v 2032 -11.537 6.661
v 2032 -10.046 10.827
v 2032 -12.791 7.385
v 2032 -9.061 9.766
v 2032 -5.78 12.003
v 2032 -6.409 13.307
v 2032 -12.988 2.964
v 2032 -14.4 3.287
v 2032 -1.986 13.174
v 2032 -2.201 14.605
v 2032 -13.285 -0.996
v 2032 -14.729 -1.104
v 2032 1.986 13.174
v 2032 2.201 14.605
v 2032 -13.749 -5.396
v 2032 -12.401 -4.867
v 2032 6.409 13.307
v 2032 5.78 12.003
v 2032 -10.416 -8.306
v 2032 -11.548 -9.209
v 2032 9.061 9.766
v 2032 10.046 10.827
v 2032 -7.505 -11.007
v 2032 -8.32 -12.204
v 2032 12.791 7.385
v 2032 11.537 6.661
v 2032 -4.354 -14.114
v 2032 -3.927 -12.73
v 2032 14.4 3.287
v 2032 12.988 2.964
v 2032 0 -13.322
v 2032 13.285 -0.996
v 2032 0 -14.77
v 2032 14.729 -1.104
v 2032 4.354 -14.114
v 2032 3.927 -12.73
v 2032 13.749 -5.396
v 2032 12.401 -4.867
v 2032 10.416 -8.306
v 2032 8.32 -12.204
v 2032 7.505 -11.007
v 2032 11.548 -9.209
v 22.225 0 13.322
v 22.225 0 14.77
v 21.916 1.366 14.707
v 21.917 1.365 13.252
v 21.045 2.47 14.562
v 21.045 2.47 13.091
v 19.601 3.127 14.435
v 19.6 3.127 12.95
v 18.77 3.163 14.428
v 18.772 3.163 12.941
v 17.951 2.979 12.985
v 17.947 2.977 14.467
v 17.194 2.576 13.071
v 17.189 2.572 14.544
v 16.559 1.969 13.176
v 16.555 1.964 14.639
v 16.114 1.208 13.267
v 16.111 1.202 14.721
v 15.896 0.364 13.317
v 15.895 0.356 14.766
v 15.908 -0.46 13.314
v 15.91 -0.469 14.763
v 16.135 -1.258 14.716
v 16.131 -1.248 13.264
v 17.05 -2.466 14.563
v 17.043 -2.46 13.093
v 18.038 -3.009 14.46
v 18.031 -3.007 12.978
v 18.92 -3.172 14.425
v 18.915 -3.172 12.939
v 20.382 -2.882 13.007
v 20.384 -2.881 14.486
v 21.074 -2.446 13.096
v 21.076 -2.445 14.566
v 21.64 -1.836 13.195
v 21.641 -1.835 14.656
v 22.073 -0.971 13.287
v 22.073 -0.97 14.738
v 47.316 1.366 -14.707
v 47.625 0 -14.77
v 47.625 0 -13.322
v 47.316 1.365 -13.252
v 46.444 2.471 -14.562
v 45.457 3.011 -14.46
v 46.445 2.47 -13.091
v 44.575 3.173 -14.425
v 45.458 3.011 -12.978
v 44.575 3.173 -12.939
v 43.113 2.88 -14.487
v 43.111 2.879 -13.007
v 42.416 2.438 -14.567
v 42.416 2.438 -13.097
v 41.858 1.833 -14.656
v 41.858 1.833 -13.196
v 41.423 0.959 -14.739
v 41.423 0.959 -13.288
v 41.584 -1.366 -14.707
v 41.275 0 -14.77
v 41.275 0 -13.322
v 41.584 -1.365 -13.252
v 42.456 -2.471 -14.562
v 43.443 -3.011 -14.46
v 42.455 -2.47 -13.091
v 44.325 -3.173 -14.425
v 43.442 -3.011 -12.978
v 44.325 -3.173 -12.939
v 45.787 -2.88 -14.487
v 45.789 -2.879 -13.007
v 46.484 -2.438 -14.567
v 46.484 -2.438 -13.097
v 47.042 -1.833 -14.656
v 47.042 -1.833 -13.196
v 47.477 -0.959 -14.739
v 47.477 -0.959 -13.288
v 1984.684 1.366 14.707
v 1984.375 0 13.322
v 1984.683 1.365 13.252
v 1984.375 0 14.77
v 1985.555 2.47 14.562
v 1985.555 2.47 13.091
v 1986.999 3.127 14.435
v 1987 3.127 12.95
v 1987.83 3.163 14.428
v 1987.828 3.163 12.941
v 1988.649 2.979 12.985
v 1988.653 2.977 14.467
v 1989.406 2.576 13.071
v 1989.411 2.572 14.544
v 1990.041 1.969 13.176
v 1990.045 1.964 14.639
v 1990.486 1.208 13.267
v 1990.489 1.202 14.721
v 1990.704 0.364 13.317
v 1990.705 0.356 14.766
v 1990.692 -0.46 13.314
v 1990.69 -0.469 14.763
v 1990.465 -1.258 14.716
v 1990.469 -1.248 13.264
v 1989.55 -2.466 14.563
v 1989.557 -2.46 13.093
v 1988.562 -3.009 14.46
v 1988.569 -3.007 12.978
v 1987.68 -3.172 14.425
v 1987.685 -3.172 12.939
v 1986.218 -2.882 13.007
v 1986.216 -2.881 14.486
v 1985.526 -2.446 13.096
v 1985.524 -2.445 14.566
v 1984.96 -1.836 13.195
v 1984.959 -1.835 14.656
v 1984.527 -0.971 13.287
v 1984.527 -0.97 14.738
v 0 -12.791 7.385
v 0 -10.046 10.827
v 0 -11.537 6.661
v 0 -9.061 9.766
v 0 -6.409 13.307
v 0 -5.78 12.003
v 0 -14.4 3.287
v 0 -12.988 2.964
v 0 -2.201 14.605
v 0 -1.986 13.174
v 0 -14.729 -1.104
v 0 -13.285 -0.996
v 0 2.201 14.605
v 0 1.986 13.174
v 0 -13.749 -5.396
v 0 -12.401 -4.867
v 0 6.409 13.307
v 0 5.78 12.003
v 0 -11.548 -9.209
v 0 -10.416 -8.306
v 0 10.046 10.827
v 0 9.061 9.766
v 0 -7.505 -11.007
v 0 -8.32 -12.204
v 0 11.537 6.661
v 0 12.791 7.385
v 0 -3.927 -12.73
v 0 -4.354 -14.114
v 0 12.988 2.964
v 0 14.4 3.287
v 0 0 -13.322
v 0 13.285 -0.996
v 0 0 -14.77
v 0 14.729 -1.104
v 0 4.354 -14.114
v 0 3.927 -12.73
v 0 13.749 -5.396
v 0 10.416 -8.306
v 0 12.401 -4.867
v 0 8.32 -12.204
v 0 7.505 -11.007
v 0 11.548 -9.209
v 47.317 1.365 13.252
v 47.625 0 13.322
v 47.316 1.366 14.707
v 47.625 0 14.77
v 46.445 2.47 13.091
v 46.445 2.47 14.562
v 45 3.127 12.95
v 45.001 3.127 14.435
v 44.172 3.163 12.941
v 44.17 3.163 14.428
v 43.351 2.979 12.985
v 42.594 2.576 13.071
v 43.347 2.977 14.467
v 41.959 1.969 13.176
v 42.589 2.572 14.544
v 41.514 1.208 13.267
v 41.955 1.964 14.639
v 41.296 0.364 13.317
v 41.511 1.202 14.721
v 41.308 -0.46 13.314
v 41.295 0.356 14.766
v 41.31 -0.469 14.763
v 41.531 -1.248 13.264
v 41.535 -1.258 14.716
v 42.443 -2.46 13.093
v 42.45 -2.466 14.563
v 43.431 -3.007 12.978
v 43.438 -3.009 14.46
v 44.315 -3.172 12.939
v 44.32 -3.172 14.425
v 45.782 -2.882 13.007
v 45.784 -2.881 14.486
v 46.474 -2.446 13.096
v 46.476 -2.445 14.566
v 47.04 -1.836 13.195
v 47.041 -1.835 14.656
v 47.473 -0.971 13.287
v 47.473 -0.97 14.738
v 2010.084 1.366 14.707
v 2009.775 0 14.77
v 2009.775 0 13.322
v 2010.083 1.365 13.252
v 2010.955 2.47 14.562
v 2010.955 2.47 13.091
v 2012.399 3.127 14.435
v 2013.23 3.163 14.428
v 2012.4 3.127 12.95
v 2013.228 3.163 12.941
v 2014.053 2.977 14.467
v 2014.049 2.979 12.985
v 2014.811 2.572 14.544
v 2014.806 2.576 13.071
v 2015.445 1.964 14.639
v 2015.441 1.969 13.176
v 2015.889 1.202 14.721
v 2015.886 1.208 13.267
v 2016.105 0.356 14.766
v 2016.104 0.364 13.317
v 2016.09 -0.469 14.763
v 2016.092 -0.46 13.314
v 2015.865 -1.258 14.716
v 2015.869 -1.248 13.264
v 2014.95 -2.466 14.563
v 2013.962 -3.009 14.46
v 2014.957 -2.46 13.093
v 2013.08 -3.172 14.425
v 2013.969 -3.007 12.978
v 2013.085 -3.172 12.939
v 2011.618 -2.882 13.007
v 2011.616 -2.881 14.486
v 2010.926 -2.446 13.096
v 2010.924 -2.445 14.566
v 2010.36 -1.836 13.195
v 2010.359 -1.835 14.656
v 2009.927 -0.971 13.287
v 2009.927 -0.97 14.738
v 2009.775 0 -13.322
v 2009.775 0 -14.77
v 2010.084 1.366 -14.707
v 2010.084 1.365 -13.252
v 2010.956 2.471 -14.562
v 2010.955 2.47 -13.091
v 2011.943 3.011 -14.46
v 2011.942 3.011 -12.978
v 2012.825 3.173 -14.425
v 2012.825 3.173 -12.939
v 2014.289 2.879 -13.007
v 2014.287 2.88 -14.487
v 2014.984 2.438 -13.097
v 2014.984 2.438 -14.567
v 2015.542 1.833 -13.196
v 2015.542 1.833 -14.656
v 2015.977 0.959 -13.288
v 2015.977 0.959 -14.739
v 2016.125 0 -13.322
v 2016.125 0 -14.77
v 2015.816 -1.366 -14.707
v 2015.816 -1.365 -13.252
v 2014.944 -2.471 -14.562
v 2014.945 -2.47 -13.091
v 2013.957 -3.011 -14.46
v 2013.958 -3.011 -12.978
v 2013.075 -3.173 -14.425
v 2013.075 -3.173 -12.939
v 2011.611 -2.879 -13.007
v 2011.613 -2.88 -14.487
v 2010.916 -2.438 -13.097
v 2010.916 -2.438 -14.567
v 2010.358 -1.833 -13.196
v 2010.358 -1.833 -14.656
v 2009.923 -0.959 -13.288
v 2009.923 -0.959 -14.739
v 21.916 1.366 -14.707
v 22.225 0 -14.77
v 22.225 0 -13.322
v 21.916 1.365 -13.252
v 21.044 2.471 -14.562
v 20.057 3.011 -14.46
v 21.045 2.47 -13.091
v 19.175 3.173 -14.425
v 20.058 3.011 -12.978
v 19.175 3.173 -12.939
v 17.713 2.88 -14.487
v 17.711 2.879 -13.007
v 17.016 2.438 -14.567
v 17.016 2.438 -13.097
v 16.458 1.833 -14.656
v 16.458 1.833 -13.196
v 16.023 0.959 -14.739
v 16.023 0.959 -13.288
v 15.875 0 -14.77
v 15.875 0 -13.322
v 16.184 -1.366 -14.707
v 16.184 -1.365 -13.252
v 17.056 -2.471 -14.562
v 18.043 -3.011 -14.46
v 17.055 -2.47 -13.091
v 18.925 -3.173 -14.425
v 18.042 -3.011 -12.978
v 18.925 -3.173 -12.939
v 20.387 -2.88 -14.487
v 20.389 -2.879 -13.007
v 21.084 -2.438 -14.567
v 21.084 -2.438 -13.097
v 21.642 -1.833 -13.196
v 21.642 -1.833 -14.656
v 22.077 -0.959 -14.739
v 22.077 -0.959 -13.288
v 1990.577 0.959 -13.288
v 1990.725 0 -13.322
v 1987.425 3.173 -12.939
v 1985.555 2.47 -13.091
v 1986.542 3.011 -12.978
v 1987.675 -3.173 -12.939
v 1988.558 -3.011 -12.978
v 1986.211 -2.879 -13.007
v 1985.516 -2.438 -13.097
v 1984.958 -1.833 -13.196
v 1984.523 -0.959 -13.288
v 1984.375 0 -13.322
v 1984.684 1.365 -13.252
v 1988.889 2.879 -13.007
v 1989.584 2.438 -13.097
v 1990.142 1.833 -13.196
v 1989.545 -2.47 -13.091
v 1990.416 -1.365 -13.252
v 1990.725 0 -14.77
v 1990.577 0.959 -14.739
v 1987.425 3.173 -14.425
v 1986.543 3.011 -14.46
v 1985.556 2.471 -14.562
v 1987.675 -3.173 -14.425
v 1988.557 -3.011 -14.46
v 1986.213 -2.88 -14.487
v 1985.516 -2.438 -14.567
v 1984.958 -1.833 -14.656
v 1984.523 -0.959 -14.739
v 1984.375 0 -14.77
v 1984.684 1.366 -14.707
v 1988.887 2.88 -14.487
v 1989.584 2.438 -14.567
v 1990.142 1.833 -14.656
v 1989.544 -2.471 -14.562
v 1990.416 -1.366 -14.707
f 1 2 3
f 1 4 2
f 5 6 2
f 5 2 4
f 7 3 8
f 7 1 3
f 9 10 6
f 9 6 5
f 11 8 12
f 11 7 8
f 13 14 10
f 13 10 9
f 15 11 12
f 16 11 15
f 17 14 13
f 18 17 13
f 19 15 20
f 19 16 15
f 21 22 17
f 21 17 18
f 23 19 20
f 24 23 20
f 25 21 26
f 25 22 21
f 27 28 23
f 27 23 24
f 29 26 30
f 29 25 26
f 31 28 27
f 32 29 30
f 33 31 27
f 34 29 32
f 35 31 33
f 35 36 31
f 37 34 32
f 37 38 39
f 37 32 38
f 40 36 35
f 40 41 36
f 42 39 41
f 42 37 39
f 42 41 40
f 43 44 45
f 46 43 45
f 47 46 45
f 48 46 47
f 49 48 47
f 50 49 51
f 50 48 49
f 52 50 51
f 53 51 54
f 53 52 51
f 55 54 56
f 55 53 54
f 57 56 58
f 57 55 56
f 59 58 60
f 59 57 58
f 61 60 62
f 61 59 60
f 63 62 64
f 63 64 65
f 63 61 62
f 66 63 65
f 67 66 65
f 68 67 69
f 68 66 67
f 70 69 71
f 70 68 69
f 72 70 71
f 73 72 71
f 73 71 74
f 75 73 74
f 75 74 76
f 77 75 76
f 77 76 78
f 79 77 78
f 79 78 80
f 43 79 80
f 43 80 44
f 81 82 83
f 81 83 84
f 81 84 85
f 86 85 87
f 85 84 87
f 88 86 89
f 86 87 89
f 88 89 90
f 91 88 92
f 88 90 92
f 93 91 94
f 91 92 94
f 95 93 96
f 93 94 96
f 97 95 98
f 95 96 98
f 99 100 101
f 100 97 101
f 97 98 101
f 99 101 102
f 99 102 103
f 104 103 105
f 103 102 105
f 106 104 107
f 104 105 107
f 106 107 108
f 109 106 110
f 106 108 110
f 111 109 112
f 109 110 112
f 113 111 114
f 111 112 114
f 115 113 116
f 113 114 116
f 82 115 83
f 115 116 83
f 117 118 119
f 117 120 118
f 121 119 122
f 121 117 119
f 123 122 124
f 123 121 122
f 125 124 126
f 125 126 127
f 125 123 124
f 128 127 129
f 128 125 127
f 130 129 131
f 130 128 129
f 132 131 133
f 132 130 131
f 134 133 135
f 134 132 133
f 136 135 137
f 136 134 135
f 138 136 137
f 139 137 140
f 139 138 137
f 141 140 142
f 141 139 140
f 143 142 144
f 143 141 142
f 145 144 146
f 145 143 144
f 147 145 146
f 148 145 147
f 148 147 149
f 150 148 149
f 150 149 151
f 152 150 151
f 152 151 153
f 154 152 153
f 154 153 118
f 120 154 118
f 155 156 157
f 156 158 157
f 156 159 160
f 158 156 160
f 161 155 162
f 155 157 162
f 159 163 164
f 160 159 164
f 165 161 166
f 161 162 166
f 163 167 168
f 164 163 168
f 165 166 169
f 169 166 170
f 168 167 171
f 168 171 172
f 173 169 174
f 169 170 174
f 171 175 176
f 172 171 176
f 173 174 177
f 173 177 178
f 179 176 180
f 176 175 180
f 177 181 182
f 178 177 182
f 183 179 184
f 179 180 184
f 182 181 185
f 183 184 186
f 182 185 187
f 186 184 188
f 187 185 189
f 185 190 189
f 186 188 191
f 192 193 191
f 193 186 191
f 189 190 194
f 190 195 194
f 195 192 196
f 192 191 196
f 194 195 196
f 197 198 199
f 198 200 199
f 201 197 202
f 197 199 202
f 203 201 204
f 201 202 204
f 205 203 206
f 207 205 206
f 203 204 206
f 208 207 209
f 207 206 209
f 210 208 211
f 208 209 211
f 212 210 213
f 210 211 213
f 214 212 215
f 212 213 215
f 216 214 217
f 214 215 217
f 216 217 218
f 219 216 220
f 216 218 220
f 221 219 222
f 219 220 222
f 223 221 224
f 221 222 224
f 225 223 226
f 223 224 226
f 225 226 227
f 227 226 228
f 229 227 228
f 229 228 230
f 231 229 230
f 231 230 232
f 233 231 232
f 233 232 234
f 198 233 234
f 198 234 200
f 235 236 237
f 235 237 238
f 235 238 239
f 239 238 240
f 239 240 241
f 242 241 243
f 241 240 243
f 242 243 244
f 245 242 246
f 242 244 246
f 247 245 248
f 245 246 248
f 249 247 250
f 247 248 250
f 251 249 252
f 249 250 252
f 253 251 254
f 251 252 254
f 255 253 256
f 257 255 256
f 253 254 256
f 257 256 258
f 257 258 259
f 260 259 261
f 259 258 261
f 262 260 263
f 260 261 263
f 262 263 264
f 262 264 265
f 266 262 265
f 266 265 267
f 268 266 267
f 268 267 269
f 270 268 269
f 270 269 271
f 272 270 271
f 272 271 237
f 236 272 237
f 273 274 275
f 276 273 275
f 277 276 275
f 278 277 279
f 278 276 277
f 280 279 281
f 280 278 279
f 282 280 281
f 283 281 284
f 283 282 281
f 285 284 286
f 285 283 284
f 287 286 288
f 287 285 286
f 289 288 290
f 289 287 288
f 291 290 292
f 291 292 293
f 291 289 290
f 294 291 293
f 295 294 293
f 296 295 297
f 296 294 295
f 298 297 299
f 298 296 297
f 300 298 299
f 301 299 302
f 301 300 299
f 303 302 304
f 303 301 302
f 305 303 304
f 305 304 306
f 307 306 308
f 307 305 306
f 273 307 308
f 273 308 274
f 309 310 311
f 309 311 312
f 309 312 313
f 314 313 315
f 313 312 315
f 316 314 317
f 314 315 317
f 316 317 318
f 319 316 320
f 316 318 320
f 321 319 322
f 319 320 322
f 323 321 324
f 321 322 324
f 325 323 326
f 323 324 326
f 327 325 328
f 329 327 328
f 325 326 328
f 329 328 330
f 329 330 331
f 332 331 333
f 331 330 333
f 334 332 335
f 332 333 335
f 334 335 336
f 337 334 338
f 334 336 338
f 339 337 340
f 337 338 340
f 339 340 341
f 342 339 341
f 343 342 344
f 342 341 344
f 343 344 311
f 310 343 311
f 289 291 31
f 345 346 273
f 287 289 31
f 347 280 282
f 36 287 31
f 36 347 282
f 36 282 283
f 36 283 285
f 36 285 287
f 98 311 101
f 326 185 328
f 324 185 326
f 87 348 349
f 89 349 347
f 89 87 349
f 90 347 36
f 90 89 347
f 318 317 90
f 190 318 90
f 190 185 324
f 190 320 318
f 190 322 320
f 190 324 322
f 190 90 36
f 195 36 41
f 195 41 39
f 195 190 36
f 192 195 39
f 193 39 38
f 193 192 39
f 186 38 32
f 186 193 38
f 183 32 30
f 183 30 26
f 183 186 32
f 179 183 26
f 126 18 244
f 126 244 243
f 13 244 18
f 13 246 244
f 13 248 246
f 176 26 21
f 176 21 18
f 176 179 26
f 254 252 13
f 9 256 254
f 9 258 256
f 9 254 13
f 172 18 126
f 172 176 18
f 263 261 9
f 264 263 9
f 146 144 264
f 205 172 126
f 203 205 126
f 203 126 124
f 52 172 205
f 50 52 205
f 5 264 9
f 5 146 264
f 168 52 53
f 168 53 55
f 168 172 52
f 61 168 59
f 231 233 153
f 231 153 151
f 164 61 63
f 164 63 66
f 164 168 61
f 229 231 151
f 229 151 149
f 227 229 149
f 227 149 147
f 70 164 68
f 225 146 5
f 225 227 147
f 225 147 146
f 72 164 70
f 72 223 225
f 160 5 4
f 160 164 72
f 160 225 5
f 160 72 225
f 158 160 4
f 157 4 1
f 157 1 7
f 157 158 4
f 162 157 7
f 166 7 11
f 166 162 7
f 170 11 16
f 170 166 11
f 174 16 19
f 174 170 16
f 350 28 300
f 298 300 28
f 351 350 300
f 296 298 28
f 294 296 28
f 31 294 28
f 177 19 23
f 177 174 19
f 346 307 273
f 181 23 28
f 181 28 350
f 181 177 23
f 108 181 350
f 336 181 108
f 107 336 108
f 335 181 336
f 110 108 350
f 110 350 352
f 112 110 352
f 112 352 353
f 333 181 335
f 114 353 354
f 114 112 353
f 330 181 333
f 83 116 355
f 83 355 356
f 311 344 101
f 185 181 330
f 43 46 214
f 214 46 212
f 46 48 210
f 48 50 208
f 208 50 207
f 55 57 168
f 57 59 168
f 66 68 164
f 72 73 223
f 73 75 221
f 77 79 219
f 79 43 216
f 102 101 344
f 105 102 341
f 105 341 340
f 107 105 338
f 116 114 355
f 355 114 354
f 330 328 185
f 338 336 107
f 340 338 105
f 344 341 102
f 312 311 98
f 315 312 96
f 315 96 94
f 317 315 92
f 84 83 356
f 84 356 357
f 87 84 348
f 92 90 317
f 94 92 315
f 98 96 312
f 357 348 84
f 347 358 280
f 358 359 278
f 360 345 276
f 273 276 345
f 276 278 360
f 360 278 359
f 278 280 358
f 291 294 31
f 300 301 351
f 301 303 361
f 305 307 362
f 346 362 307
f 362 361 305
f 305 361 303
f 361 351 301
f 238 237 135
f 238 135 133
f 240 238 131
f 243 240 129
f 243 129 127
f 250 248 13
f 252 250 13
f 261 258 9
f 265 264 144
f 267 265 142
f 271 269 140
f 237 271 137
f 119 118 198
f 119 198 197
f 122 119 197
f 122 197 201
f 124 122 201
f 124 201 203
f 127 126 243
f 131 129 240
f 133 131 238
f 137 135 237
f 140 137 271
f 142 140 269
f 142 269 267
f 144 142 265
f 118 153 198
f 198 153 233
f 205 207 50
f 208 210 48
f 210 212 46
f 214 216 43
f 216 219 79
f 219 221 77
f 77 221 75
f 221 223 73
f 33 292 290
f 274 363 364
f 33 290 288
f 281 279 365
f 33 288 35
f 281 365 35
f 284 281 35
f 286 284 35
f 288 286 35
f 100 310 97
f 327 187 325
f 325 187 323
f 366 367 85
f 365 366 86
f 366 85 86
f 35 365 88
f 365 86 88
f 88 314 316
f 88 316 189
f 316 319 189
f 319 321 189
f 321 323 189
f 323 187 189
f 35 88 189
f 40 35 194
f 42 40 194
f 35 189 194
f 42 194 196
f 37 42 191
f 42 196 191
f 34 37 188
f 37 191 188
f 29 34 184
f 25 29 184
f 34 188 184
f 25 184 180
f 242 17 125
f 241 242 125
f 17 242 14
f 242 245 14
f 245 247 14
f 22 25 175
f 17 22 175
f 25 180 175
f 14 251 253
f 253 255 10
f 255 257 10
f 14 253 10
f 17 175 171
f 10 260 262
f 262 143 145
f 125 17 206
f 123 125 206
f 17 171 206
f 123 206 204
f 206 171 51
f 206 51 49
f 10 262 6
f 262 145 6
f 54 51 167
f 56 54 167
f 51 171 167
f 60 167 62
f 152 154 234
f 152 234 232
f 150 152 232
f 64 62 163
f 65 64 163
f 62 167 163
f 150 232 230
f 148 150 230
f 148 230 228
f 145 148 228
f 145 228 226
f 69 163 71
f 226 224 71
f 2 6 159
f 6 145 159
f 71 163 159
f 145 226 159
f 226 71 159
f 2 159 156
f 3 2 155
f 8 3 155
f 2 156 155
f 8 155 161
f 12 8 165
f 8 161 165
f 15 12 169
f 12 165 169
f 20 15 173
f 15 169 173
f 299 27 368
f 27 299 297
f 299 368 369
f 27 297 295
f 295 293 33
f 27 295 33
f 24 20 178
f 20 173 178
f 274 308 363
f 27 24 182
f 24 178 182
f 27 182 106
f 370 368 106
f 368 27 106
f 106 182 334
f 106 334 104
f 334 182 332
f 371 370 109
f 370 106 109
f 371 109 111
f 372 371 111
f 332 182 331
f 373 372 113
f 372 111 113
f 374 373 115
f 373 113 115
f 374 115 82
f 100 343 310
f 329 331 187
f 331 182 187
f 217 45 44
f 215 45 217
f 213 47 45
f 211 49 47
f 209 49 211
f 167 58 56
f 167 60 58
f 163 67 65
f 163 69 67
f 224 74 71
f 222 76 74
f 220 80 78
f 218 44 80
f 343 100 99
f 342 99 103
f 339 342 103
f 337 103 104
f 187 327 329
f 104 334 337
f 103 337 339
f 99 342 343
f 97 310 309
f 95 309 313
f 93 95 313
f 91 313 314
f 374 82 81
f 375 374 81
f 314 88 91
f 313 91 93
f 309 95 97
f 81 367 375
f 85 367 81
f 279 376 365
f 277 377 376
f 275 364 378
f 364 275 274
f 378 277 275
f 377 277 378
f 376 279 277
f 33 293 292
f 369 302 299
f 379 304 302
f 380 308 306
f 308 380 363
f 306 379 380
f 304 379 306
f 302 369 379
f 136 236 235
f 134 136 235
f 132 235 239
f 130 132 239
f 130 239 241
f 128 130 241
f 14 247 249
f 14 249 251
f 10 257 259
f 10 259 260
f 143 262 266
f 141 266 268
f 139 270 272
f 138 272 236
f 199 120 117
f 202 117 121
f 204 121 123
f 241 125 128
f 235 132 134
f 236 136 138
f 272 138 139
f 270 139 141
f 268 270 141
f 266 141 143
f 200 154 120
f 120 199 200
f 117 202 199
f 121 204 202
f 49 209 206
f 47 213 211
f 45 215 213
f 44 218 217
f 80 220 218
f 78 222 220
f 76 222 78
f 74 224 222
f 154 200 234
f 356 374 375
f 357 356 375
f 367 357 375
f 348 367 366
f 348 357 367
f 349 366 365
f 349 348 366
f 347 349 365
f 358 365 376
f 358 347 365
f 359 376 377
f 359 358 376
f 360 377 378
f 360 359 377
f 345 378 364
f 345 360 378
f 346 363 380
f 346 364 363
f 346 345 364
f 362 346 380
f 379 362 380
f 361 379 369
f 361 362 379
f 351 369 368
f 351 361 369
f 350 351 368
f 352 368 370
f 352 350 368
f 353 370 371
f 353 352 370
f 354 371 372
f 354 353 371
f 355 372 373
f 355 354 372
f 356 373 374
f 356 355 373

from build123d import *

# Parameters (mm, degrees)
SKETCH1_R           = 14.7701
SKETCH1_R_2         = 13.3223
BOSS_EXTRUDE1_DEPTH = 2032
SKETCH2_R           = 3.175
CUT_EXTRUDE1_DEPTH  = 2033.107357328


with BuildPart() as part:
    # Sketch1 → Boss-Extrude1 (new body)
    with BuildSketch(Plane(origin=(0, 0, 0), x_dir=(0, 0, -1), z_dir=(1, 0, 0))):
        Circle(SKETCH1_R)
        Circle(SKETCH1_R_2, mode=Mode.SUBTRACT)
    extrude(amount=BOSS_EXTRUDE1_DEPTH)

    # Sketch2 → Cut-Extrude1 (cut, symmetric)
    with BuildSketch(Plane.XY):
        with Locations((19.05, 0)):
            Circle(SKETCH2_R)
        with Locations((44.45, 0)):
            Circle(SKETCH2_R)
    cut_extrude1 = extrude(amount=CUT_EXTRUDE1_DEPTH, both=True, mode=Mode.SUBTRACT)

    # Mirror1: Cut-Extrude1 across plane
    add(cut_extrude1.mirror(Plane(origin=(1016, 0, 0), x_dir=(0, 0, 1), z_dir=(1, 0, 0))), mode=Mode.SUBTRACT)


solid = part.part
